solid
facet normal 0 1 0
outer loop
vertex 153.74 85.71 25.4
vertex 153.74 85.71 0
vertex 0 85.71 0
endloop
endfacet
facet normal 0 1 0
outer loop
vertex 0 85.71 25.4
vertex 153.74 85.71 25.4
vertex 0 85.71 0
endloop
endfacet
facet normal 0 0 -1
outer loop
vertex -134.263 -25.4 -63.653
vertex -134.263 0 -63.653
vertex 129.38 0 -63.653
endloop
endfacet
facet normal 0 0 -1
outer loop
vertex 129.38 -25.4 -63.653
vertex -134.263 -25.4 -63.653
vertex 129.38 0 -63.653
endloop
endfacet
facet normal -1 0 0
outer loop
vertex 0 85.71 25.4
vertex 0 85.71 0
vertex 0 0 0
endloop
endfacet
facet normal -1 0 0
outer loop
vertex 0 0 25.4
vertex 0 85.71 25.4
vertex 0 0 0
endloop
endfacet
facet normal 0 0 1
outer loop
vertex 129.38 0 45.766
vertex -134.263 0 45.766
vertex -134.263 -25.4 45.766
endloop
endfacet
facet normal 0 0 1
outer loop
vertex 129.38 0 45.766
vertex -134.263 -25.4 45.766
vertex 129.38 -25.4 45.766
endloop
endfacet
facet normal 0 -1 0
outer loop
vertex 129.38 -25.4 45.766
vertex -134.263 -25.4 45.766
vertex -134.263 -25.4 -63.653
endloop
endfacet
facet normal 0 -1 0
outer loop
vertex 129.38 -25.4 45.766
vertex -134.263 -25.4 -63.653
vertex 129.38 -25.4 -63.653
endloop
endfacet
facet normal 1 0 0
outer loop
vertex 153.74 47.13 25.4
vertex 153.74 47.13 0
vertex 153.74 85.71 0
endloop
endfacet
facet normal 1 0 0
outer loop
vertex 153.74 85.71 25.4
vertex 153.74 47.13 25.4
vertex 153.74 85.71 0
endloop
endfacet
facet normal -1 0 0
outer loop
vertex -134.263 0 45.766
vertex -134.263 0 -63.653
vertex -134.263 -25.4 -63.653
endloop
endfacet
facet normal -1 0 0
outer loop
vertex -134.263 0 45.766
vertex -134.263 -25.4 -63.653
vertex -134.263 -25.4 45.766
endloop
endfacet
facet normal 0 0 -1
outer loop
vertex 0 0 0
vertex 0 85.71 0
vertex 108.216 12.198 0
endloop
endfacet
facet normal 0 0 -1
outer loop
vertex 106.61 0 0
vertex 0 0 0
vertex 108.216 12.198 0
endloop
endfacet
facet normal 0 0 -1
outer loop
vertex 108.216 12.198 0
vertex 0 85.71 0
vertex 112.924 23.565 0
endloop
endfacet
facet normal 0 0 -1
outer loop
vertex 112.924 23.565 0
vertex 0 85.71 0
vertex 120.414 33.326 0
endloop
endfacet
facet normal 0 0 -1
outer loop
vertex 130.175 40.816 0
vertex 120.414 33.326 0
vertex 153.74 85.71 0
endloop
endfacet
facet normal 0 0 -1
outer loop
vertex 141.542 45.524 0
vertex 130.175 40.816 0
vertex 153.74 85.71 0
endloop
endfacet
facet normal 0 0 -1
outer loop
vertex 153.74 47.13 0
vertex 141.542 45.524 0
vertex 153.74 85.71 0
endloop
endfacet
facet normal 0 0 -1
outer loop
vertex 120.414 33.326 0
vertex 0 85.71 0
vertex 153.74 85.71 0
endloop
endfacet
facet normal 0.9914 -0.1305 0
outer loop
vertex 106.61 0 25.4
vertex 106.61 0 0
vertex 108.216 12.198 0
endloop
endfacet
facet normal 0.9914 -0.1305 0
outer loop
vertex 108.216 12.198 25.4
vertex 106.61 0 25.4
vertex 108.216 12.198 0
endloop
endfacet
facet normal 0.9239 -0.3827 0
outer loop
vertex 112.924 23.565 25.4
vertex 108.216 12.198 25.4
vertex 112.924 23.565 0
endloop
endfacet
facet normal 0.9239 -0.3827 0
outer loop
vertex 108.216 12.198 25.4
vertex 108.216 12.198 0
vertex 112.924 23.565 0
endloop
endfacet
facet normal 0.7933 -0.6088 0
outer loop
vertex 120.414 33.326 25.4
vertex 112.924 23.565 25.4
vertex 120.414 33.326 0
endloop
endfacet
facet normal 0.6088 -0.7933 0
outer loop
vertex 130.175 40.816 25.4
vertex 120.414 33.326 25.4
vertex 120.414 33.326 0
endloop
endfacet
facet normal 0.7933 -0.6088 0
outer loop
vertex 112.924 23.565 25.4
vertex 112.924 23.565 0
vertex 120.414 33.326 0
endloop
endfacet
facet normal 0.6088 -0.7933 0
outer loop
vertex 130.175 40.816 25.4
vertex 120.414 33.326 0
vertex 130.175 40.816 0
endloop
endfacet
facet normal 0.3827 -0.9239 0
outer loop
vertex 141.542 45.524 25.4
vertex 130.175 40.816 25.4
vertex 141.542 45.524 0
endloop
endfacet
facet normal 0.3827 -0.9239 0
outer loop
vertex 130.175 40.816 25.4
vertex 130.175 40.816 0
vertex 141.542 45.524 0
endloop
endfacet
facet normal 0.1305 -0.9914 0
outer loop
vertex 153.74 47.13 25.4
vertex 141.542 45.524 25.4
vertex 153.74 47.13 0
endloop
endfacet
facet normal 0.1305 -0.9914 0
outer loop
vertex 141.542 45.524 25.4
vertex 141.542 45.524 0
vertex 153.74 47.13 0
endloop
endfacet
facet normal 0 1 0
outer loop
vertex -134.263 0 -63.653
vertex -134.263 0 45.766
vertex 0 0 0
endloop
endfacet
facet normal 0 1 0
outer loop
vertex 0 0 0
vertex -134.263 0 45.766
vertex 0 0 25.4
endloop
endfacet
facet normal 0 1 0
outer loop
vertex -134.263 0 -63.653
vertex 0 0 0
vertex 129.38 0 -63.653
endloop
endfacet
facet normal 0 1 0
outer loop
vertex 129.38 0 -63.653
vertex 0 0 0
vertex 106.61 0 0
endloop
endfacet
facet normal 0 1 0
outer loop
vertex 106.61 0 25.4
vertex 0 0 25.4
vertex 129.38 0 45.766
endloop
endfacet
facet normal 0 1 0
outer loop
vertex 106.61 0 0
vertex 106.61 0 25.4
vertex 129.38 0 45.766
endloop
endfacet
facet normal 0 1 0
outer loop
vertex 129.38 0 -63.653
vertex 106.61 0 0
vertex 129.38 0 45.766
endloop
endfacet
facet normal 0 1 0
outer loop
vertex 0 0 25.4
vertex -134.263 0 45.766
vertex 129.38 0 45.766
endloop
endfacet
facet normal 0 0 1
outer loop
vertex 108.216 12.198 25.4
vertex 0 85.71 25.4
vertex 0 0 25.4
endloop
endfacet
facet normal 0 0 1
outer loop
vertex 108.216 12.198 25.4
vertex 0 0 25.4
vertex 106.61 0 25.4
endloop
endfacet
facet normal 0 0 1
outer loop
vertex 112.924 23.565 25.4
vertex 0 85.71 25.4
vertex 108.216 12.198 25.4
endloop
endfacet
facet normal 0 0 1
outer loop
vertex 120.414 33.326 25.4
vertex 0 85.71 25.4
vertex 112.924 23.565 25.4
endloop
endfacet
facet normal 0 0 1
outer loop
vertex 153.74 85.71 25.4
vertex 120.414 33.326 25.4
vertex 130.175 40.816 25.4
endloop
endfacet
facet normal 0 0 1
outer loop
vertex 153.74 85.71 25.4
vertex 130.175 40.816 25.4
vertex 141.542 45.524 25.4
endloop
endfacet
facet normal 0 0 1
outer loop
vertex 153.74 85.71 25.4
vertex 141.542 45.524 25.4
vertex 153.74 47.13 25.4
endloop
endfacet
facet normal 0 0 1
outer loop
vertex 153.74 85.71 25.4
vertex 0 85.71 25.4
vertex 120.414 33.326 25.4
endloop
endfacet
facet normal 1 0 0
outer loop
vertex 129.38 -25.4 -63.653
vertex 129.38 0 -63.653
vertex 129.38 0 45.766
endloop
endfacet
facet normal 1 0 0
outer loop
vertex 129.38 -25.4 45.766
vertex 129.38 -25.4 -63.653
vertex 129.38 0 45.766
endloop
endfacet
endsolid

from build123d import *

# Parameters (mm, degrees)
F0_W     = 263.6432349682
F0_H     = 109.4194687903
F0_W_2   = 227.0261347294
F0_H_2   = 80.9316635132
F1_DEPTH = 25.4
F3_DEPTH = 25.4


with BuildPart() as f1:
    # F0 (on Front) → F1 (new body)
    with BuildSketch(Plane.XZ):
        with Locations((-2.4411380291, -8.943548426)):
            Rectangle(F0_W, F0_H)
        with Locations((-3.0514225364, -5.458008498)):
            Rectangle(F0_W_2, F0_H_2, mode=Mode.SUBTRACT)
        with Locations((-3.0514225364, -5.458008498)):
            Rectangle(F0_W_2, F0_H_2)
    extrude(amount=F1_DEPTH)

    # F2 (on Top) → F3 (join)
    with BuildSketch(Plane.XY):
        with BuildLine():
            Line((0, 85.7104361057), (0, 0))
            Line((0, 0), (106.6103050285, 0))
            ThreePointArc((106.6103050285, 0), (120.414287269, 33.3257611396), (153.7400484085, 47.12974338))
            Line((153.7400484085, 47.12974338), (153.7400484085, 85.7104361057))
            Line((153.7400484085, 85.7104361057), (0, 85.7104361057))
        make_face()
    extrude(amount=F3_DEPTH)


solid = f1.part
